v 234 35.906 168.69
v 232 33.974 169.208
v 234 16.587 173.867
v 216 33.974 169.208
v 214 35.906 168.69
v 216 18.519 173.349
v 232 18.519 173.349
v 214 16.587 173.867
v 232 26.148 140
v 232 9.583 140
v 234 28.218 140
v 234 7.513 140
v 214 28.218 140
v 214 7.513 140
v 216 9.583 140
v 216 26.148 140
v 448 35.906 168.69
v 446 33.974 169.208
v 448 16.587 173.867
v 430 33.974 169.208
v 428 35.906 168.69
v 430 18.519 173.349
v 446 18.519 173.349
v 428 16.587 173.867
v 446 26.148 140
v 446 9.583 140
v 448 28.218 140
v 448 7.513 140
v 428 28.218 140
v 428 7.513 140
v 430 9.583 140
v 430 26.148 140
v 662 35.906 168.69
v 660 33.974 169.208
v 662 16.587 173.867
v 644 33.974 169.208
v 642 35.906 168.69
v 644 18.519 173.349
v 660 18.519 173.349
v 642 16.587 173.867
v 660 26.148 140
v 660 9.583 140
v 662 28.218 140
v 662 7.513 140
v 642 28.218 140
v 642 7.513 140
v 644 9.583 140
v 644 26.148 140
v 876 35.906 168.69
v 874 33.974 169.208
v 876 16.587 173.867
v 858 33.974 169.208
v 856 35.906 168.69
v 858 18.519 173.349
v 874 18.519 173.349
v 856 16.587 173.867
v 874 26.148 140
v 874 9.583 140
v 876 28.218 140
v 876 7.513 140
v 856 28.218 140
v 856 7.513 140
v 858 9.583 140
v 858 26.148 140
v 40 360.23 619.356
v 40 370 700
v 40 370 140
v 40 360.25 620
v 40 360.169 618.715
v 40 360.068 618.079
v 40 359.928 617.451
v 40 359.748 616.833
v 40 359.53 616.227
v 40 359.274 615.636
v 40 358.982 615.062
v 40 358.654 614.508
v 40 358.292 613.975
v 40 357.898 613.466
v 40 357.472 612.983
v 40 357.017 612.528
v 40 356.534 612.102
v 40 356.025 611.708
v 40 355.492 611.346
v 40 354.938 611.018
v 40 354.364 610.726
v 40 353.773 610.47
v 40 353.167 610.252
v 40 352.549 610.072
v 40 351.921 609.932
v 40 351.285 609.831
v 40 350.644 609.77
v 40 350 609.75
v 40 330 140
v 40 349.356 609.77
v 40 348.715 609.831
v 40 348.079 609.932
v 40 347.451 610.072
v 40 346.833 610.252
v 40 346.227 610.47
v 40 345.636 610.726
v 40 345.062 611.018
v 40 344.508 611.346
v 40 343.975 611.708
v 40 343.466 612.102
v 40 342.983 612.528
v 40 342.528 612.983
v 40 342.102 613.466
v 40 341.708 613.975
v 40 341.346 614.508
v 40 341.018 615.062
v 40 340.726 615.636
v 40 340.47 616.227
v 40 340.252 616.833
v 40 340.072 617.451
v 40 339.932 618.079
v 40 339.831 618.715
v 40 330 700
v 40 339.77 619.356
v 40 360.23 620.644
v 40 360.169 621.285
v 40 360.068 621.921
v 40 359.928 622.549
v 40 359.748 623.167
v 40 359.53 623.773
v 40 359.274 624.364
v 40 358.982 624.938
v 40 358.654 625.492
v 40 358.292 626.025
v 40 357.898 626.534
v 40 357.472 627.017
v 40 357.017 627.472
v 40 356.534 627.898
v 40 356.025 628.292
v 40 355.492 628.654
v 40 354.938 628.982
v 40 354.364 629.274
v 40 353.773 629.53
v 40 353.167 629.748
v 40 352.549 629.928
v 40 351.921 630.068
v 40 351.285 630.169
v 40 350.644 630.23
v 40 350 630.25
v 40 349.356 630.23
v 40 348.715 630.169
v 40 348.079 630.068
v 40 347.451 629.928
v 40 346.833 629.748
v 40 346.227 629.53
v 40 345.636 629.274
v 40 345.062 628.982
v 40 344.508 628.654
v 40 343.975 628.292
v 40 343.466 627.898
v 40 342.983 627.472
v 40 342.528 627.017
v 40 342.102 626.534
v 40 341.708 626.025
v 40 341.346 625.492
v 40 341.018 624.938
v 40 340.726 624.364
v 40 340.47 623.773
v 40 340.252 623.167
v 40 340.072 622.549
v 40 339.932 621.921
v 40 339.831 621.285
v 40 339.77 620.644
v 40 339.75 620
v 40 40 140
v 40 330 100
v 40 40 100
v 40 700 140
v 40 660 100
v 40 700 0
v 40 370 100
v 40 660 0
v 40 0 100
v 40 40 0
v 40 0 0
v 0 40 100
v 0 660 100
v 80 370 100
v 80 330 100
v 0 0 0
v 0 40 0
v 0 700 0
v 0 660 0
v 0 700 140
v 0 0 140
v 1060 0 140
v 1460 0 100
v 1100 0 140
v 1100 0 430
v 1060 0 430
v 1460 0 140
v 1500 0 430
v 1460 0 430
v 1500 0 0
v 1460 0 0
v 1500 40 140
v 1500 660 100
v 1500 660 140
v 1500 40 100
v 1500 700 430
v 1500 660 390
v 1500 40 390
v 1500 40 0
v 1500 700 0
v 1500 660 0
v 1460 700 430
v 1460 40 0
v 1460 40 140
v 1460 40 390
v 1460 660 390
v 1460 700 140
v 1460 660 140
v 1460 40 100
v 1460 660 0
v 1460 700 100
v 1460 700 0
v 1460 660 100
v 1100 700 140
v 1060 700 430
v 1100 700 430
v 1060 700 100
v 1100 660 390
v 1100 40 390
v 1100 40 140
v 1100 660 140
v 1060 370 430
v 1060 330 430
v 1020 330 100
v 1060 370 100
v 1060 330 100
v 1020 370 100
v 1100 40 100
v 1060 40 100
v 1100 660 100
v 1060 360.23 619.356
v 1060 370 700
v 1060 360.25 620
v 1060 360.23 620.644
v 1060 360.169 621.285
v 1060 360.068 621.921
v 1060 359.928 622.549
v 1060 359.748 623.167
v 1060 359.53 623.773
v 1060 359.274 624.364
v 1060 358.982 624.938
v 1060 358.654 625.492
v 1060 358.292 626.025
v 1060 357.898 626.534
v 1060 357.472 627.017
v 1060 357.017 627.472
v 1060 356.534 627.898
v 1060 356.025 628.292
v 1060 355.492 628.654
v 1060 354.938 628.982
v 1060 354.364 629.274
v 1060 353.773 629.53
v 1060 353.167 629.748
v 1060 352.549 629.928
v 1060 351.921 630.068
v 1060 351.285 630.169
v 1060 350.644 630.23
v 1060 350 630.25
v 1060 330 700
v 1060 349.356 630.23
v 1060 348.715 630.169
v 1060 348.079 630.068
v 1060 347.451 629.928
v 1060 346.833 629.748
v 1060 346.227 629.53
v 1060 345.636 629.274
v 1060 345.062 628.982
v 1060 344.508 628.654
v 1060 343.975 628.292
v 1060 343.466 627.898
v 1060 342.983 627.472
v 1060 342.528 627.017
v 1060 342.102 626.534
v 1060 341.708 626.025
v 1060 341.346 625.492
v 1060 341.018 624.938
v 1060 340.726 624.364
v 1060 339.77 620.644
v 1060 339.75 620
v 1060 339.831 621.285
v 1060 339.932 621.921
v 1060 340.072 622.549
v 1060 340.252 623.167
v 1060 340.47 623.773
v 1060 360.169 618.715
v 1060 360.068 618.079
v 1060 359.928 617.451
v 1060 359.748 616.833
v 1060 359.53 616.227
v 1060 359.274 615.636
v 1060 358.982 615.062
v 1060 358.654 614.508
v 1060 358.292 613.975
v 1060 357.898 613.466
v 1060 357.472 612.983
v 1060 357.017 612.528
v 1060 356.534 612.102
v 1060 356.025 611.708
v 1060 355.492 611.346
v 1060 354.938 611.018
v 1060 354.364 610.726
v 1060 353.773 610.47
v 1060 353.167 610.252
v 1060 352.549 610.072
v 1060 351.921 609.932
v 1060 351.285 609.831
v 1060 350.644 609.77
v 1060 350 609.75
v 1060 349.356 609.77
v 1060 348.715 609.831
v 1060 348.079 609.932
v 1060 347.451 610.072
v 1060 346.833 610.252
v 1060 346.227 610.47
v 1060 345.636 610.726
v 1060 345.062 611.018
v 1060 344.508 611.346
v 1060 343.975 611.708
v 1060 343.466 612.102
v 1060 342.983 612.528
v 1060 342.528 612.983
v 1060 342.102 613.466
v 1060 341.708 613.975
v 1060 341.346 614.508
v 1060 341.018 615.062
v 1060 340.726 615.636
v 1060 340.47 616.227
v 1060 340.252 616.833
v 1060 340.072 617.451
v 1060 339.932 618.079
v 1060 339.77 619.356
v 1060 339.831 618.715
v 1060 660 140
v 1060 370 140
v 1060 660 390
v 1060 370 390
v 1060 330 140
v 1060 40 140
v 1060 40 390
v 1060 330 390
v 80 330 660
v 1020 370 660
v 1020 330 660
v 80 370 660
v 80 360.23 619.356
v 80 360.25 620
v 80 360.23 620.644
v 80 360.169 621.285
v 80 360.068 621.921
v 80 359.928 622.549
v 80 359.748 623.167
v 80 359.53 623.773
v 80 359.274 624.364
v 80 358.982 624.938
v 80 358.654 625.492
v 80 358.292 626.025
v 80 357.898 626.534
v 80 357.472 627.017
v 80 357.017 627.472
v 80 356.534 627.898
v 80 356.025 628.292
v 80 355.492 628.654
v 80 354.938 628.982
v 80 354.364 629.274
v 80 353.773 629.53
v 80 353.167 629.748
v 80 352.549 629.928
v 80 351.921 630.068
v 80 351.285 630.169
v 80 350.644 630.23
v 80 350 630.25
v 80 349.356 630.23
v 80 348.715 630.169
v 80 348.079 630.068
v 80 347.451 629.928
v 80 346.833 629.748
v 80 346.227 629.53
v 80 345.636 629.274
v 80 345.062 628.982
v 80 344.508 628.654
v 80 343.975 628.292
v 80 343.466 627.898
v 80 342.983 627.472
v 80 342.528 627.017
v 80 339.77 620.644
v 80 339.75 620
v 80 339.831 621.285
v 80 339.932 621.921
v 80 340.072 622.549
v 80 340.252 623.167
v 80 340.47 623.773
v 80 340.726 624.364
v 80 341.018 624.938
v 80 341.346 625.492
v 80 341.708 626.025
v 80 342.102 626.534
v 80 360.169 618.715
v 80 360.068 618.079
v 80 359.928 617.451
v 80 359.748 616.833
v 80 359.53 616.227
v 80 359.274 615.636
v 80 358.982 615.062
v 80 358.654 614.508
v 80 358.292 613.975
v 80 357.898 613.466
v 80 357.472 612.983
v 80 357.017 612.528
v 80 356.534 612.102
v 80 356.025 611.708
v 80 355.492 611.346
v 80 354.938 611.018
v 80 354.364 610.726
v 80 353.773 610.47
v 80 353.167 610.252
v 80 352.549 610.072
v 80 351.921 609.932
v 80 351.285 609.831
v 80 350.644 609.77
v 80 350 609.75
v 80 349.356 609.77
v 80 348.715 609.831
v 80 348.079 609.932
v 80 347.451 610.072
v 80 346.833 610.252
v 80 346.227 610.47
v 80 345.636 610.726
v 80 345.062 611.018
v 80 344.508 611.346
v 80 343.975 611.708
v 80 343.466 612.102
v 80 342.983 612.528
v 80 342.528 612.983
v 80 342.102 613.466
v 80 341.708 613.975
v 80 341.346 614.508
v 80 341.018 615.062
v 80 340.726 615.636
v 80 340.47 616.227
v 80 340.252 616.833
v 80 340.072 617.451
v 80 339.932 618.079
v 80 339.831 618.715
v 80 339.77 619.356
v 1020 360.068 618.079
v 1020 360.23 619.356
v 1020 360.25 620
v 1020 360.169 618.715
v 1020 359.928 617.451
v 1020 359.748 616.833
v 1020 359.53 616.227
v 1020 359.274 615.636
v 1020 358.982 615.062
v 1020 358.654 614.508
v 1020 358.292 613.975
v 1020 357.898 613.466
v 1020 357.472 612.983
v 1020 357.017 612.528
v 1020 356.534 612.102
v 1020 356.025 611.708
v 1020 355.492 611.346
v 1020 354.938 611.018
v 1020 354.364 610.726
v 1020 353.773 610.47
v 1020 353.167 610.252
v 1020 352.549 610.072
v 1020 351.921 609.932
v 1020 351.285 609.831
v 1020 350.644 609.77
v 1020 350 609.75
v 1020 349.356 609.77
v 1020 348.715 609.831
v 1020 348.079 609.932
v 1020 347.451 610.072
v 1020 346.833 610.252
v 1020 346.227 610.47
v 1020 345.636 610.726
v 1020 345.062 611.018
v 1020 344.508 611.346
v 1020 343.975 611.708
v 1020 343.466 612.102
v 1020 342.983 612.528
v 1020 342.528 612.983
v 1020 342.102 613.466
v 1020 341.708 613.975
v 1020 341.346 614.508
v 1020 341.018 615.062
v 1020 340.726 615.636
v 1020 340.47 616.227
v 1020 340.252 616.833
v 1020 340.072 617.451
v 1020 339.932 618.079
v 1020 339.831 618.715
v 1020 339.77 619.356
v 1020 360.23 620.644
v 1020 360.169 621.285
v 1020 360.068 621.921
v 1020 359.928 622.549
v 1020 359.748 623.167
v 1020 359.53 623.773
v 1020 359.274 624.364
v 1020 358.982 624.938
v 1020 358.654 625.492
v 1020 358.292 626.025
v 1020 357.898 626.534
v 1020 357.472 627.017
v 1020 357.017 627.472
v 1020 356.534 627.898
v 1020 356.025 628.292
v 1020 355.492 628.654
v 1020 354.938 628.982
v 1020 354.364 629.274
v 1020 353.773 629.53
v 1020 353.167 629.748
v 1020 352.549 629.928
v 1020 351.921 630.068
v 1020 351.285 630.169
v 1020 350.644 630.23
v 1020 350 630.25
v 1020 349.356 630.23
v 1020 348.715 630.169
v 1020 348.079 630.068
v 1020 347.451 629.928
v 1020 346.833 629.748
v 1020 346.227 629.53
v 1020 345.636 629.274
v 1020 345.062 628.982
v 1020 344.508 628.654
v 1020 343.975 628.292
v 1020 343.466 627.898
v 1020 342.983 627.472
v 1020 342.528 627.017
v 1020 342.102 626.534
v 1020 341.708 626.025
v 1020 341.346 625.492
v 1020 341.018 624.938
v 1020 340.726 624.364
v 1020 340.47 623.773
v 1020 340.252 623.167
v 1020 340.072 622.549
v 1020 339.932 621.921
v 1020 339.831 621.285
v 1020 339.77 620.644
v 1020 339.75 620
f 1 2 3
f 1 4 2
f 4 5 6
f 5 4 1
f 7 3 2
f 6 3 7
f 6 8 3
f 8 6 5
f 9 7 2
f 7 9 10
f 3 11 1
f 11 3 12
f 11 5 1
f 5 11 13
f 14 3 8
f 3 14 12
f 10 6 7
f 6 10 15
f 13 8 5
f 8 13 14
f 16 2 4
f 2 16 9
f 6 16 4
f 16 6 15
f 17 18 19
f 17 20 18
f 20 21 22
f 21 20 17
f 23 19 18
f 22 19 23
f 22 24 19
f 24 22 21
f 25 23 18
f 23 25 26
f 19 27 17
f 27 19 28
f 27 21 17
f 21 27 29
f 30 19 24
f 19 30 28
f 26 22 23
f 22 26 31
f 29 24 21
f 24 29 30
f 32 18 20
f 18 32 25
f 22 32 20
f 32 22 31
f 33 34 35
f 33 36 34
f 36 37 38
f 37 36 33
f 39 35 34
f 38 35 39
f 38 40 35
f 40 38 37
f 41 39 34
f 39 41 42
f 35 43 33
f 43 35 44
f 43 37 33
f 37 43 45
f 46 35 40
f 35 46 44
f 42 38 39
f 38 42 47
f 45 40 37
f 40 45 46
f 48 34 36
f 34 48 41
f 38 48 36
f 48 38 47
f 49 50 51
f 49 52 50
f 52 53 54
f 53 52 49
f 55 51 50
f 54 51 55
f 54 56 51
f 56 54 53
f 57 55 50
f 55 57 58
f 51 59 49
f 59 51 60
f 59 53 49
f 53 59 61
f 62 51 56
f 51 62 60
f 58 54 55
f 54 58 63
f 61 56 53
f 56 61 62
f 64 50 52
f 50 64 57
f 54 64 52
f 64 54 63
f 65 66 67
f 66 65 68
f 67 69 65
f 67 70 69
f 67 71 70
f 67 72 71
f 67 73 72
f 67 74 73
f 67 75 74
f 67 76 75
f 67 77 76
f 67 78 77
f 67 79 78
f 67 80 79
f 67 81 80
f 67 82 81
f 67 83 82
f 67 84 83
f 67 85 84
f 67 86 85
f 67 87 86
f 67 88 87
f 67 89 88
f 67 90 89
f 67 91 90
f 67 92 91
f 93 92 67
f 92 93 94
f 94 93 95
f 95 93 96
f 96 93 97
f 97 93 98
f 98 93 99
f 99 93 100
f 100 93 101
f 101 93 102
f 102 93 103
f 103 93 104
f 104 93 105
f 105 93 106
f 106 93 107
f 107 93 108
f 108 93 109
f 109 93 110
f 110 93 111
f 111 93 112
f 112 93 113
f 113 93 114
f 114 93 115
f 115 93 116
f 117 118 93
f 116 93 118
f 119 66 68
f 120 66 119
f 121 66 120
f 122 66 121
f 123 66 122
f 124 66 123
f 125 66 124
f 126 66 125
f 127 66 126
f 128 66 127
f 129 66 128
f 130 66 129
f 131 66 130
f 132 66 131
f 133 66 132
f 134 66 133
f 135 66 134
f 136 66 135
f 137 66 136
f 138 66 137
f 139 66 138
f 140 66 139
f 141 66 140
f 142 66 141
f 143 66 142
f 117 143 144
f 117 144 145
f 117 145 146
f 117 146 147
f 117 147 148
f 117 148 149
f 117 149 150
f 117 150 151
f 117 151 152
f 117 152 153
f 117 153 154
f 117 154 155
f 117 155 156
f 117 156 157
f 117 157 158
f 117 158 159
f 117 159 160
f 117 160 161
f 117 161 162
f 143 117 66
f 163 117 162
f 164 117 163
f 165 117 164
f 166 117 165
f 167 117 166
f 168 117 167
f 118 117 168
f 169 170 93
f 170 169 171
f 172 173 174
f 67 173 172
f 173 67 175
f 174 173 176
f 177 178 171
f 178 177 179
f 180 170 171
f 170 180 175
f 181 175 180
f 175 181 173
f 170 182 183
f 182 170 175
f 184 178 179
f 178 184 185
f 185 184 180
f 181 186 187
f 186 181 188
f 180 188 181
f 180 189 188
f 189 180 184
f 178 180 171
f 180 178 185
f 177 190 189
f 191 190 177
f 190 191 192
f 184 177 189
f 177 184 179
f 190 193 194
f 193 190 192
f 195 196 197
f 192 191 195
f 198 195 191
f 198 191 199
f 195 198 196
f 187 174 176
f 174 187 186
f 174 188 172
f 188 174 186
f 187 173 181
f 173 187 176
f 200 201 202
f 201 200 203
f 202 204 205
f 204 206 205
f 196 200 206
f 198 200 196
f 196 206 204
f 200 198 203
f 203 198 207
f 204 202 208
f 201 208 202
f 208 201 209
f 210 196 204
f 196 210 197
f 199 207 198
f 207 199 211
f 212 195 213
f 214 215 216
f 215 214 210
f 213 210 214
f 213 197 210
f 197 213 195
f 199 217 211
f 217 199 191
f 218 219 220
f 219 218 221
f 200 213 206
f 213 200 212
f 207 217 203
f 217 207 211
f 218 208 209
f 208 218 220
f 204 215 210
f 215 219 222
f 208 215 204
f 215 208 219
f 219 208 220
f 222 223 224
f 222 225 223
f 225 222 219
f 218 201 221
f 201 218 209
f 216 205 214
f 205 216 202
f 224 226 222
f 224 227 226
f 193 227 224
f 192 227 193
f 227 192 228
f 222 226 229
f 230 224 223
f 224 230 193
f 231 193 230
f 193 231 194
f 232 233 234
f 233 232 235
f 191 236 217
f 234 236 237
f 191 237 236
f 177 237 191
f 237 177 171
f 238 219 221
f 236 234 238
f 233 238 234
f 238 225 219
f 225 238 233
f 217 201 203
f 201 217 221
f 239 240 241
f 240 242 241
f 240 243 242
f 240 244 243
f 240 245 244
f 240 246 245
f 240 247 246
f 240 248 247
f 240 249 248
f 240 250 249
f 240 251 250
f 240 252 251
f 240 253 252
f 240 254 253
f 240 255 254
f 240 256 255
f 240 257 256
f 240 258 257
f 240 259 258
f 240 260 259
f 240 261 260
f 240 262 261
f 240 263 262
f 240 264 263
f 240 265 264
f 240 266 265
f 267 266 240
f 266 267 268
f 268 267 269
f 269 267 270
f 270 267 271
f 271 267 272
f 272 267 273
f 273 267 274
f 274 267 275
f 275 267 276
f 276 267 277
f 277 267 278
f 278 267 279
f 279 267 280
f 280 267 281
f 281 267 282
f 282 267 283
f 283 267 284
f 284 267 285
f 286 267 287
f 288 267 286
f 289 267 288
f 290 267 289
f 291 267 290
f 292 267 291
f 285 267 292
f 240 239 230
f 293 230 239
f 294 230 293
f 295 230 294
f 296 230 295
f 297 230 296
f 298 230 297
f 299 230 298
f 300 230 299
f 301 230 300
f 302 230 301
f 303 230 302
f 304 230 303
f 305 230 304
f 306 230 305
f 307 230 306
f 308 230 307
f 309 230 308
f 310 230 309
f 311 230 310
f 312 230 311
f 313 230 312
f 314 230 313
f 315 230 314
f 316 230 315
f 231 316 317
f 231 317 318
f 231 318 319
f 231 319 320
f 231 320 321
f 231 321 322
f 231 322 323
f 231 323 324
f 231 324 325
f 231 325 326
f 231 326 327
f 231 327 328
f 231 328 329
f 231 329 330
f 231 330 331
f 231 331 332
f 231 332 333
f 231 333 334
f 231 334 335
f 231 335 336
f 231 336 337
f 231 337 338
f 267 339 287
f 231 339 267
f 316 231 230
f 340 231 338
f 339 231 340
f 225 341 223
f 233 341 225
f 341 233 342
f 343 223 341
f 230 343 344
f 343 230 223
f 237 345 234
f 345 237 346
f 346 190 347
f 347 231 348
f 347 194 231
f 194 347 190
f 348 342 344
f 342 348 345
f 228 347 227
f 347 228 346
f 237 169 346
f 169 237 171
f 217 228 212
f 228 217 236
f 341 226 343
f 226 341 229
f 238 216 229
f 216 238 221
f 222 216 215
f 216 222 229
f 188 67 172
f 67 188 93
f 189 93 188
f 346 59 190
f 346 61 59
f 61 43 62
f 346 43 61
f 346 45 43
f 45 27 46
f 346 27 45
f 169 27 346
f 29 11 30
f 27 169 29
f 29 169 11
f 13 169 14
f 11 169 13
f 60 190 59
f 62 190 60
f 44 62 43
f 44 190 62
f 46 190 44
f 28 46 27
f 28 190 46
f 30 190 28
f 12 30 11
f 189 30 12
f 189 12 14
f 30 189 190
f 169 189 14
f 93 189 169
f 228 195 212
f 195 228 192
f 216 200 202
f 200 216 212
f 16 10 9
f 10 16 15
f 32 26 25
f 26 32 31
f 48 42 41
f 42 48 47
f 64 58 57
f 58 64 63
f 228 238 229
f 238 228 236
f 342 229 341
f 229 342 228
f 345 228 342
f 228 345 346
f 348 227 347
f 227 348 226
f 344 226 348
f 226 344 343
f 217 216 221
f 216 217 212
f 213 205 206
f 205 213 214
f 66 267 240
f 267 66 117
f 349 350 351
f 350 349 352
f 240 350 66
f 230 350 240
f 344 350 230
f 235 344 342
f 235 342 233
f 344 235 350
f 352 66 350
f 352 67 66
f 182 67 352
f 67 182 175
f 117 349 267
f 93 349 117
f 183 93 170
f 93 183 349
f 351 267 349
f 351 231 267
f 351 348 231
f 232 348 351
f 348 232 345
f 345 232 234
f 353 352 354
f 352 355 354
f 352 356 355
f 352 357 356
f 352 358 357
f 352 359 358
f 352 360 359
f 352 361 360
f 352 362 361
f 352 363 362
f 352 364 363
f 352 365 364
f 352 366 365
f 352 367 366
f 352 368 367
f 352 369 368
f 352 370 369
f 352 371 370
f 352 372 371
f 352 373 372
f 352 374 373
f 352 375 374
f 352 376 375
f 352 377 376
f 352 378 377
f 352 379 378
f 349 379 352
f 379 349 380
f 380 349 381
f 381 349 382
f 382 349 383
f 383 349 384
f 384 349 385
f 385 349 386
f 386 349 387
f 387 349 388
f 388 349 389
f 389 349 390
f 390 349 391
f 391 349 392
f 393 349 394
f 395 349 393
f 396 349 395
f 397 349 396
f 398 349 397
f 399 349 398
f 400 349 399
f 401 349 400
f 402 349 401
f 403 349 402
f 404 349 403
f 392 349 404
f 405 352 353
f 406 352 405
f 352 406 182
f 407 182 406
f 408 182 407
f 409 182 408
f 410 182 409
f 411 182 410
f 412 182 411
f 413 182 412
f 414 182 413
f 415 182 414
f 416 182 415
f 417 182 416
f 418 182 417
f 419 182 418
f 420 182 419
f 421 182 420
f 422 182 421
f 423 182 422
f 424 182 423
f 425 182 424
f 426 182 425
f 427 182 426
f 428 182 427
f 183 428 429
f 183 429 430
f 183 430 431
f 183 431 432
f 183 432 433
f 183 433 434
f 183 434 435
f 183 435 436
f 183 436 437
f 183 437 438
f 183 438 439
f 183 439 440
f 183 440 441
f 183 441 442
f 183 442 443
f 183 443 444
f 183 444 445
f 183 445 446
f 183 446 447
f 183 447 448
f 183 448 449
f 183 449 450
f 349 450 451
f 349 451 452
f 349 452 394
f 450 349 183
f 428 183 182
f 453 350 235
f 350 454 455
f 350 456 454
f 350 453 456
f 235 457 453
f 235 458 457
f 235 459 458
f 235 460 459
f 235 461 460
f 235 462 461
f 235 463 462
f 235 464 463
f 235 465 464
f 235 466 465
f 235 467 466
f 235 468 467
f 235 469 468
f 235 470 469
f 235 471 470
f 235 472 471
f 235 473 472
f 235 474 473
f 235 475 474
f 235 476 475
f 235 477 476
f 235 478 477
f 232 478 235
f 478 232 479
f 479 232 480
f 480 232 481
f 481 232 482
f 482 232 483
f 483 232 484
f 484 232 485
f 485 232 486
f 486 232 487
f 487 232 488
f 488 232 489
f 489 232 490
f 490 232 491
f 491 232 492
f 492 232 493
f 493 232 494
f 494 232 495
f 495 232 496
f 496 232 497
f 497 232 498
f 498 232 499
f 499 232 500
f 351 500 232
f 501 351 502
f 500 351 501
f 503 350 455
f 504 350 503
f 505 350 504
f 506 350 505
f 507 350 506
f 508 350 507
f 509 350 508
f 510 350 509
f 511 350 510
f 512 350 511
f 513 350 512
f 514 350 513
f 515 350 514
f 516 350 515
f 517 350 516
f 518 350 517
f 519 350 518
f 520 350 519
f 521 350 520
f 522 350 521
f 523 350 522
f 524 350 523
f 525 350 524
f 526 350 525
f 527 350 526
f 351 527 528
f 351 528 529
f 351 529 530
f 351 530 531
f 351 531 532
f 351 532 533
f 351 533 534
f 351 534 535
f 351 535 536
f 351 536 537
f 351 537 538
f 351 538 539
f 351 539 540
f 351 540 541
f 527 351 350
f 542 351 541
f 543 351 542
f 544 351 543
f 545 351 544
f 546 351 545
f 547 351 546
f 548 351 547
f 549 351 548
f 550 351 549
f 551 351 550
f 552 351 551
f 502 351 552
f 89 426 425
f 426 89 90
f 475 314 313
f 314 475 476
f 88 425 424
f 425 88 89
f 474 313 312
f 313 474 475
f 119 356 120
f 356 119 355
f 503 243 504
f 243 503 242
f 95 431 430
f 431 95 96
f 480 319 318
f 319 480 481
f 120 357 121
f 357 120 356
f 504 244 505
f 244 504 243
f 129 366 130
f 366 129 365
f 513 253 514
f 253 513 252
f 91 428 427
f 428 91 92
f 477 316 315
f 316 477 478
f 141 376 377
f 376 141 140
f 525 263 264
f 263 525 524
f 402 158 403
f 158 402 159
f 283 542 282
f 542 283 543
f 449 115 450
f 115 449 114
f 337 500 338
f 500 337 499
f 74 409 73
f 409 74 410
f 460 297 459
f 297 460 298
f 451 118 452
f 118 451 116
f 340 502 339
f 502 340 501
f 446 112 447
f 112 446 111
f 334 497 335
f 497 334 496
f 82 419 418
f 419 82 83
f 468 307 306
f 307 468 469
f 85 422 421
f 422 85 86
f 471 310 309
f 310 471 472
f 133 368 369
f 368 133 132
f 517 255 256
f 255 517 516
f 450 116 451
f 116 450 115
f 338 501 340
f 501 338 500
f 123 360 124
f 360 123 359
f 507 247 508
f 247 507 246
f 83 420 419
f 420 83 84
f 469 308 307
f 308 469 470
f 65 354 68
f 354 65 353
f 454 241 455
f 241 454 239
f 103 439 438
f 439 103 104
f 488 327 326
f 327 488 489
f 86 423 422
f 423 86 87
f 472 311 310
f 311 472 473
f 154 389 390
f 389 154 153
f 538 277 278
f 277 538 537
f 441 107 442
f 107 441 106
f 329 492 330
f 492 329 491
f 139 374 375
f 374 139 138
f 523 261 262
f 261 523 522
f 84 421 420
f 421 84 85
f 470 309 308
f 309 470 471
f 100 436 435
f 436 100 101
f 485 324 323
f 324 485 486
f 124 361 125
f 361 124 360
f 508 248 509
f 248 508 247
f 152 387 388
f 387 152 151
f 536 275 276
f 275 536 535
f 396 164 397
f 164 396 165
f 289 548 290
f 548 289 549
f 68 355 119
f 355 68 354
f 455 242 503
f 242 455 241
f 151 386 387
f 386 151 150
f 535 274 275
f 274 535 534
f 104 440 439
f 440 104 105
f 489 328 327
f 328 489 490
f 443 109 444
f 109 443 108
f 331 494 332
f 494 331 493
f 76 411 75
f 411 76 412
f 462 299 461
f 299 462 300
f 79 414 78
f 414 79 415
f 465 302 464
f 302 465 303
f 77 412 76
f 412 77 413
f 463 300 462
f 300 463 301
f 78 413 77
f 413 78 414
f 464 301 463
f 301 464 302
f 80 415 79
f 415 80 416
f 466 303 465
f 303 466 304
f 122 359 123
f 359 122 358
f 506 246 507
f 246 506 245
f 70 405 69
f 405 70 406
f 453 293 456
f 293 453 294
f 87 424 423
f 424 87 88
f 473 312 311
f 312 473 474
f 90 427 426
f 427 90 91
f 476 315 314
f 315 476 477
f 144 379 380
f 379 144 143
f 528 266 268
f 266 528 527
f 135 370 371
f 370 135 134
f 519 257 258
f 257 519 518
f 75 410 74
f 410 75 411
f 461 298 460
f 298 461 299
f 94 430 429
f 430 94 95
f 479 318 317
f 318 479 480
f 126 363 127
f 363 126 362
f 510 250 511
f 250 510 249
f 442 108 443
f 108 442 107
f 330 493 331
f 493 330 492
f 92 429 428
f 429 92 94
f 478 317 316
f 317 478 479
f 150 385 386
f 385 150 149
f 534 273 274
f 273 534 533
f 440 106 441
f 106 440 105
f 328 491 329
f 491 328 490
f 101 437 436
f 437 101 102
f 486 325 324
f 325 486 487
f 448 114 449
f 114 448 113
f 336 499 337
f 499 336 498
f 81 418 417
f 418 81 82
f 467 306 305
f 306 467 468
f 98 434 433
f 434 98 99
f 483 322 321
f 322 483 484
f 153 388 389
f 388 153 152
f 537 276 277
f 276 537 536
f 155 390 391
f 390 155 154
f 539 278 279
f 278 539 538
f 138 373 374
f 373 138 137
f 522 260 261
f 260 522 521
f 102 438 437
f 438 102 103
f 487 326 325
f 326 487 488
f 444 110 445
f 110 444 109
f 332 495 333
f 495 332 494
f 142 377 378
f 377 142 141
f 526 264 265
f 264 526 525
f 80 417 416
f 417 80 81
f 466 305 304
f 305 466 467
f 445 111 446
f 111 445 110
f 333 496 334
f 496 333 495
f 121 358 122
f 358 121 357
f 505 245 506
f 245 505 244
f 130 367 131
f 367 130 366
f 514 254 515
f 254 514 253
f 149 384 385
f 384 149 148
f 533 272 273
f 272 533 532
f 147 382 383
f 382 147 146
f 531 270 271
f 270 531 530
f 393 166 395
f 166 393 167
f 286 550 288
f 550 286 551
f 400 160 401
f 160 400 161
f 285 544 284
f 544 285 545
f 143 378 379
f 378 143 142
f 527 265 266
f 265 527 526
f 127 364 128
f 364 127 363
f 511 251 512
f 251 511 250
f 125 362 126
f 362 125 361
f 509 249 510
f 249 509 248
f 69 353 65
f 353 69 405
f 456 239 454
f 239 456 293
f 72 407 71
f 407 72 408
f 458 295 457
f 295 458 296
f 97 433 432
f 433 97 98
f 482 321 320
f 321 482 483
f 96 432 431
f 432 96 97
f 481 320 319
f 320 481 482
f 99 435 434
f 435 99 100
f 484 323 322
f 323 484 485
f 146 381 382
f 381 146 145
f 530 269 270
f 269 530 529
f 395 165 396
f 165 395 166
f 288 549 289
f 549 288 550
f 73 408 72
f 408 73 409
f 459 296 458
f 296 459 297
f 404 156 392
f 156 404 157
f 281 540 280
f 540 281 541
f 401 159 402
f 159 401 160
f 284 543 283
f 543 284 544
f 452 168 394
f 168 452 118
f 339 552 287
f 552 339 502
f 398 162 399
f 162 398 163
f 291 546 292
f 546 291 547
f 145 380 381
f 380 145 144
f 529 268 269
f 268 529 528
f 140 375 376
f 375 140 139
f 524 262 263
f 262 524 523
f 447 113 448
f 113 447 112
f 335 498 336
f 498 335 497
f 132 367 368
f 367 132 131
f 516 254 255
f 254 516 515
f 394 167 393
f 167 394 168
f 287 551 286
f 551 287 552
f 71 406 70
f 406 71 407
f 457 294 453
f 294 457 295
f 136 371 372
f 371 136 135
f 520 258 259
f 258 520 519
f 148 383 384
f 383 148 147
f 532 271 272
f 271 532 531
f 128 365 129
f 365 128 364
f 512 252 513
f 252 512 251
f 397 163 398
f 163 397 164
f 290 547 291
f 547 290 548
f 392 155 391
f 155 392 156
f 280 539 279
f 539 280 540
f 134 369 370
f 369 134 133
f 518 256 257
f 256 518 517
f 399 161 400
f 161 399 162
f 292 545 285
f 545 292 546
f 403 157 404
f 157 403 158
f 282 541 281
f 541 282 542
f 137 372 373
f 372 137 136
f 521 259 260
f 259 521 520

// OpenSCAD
// file: ../../library/profiles.scad
module lShapeProfile($length, $size, $thickness) {
    cube([$length, $size, $thickness]);
    rotate([90, 0, 0])
    translate([0, 0, -$thickness]) cube([$length, $size, $thickness]);
}


module uShapeProfile($length, $size, $thickness) {
    cube([$length, $size, $thickness]);
    rotate([90, 0, 0])
    translate([0, 0, -$thickness]) cube([$length, $size, $thickness]);

    translate([0, $size, 0])
    rotate([90, 0, 0])
    cube([$length, $size, $thickness]);
}


module squareTubeProfile($length, $size, $thickness) {
    cube([$length, $size, $thickness]);

    rotate([90, 0, 0])
    translate([0, 0, -$thickness])
    cube([$length, $size, $thickness]);

    translate([0, $size, 0])
    rotate([90, 0, 0])
    cube([$length, $size, $thickness]);

    translate([0, 0, $size - $thickness])
    cube([$length, $size, $thickness]);
}
// file: spindleHole.scad
include <./config.scad>

module spindleHole() {
    rotate([0, 90, 0]) {
        cylinder(d = spindleDiameter+0.5, h = outerWidth - fireBasketWidth - (profileSize * 2) + 20, $fn = 100);
    }
}
// file: config.scad
drawReferences = false;
drawReferenceWall = true;

outerWidth = 1500;
outerDepth = 700;
outerHeight = 700;

profileSize = 40;

fireBasketHeight = 250;
fireBasketWidth = 400;
fireBasketGroundClearance = 100;
fireBasketFrontOpen = true;

spindleDiameter  = 20;
spindleOverlength = 5;
spindleWallExtension = 140;
spindleWheelDiameter = 200;
spindlePlateThickness = 5;
spindlePlateGap = 2;
spindleHandleThickness = 8;

grateGap = 4;
grateSize = 30;
grateProfileThickness = 3;

lineThickness = 1;
lineGap = 80;
textSize = 20;

$fn = 120;
// main file
include <./config.scad>

use <./frame.scad>
use <./spindleHole.scad>



color([65/255, 75/255, 95/255]) difference() {
	frame();

    translate([profileSize-spindleOverlength, outerDepth/2, outerHeight - profileSize - spindleDiameter - 20])
    #spindleHole();
}


// start csv header
framePartsList();
